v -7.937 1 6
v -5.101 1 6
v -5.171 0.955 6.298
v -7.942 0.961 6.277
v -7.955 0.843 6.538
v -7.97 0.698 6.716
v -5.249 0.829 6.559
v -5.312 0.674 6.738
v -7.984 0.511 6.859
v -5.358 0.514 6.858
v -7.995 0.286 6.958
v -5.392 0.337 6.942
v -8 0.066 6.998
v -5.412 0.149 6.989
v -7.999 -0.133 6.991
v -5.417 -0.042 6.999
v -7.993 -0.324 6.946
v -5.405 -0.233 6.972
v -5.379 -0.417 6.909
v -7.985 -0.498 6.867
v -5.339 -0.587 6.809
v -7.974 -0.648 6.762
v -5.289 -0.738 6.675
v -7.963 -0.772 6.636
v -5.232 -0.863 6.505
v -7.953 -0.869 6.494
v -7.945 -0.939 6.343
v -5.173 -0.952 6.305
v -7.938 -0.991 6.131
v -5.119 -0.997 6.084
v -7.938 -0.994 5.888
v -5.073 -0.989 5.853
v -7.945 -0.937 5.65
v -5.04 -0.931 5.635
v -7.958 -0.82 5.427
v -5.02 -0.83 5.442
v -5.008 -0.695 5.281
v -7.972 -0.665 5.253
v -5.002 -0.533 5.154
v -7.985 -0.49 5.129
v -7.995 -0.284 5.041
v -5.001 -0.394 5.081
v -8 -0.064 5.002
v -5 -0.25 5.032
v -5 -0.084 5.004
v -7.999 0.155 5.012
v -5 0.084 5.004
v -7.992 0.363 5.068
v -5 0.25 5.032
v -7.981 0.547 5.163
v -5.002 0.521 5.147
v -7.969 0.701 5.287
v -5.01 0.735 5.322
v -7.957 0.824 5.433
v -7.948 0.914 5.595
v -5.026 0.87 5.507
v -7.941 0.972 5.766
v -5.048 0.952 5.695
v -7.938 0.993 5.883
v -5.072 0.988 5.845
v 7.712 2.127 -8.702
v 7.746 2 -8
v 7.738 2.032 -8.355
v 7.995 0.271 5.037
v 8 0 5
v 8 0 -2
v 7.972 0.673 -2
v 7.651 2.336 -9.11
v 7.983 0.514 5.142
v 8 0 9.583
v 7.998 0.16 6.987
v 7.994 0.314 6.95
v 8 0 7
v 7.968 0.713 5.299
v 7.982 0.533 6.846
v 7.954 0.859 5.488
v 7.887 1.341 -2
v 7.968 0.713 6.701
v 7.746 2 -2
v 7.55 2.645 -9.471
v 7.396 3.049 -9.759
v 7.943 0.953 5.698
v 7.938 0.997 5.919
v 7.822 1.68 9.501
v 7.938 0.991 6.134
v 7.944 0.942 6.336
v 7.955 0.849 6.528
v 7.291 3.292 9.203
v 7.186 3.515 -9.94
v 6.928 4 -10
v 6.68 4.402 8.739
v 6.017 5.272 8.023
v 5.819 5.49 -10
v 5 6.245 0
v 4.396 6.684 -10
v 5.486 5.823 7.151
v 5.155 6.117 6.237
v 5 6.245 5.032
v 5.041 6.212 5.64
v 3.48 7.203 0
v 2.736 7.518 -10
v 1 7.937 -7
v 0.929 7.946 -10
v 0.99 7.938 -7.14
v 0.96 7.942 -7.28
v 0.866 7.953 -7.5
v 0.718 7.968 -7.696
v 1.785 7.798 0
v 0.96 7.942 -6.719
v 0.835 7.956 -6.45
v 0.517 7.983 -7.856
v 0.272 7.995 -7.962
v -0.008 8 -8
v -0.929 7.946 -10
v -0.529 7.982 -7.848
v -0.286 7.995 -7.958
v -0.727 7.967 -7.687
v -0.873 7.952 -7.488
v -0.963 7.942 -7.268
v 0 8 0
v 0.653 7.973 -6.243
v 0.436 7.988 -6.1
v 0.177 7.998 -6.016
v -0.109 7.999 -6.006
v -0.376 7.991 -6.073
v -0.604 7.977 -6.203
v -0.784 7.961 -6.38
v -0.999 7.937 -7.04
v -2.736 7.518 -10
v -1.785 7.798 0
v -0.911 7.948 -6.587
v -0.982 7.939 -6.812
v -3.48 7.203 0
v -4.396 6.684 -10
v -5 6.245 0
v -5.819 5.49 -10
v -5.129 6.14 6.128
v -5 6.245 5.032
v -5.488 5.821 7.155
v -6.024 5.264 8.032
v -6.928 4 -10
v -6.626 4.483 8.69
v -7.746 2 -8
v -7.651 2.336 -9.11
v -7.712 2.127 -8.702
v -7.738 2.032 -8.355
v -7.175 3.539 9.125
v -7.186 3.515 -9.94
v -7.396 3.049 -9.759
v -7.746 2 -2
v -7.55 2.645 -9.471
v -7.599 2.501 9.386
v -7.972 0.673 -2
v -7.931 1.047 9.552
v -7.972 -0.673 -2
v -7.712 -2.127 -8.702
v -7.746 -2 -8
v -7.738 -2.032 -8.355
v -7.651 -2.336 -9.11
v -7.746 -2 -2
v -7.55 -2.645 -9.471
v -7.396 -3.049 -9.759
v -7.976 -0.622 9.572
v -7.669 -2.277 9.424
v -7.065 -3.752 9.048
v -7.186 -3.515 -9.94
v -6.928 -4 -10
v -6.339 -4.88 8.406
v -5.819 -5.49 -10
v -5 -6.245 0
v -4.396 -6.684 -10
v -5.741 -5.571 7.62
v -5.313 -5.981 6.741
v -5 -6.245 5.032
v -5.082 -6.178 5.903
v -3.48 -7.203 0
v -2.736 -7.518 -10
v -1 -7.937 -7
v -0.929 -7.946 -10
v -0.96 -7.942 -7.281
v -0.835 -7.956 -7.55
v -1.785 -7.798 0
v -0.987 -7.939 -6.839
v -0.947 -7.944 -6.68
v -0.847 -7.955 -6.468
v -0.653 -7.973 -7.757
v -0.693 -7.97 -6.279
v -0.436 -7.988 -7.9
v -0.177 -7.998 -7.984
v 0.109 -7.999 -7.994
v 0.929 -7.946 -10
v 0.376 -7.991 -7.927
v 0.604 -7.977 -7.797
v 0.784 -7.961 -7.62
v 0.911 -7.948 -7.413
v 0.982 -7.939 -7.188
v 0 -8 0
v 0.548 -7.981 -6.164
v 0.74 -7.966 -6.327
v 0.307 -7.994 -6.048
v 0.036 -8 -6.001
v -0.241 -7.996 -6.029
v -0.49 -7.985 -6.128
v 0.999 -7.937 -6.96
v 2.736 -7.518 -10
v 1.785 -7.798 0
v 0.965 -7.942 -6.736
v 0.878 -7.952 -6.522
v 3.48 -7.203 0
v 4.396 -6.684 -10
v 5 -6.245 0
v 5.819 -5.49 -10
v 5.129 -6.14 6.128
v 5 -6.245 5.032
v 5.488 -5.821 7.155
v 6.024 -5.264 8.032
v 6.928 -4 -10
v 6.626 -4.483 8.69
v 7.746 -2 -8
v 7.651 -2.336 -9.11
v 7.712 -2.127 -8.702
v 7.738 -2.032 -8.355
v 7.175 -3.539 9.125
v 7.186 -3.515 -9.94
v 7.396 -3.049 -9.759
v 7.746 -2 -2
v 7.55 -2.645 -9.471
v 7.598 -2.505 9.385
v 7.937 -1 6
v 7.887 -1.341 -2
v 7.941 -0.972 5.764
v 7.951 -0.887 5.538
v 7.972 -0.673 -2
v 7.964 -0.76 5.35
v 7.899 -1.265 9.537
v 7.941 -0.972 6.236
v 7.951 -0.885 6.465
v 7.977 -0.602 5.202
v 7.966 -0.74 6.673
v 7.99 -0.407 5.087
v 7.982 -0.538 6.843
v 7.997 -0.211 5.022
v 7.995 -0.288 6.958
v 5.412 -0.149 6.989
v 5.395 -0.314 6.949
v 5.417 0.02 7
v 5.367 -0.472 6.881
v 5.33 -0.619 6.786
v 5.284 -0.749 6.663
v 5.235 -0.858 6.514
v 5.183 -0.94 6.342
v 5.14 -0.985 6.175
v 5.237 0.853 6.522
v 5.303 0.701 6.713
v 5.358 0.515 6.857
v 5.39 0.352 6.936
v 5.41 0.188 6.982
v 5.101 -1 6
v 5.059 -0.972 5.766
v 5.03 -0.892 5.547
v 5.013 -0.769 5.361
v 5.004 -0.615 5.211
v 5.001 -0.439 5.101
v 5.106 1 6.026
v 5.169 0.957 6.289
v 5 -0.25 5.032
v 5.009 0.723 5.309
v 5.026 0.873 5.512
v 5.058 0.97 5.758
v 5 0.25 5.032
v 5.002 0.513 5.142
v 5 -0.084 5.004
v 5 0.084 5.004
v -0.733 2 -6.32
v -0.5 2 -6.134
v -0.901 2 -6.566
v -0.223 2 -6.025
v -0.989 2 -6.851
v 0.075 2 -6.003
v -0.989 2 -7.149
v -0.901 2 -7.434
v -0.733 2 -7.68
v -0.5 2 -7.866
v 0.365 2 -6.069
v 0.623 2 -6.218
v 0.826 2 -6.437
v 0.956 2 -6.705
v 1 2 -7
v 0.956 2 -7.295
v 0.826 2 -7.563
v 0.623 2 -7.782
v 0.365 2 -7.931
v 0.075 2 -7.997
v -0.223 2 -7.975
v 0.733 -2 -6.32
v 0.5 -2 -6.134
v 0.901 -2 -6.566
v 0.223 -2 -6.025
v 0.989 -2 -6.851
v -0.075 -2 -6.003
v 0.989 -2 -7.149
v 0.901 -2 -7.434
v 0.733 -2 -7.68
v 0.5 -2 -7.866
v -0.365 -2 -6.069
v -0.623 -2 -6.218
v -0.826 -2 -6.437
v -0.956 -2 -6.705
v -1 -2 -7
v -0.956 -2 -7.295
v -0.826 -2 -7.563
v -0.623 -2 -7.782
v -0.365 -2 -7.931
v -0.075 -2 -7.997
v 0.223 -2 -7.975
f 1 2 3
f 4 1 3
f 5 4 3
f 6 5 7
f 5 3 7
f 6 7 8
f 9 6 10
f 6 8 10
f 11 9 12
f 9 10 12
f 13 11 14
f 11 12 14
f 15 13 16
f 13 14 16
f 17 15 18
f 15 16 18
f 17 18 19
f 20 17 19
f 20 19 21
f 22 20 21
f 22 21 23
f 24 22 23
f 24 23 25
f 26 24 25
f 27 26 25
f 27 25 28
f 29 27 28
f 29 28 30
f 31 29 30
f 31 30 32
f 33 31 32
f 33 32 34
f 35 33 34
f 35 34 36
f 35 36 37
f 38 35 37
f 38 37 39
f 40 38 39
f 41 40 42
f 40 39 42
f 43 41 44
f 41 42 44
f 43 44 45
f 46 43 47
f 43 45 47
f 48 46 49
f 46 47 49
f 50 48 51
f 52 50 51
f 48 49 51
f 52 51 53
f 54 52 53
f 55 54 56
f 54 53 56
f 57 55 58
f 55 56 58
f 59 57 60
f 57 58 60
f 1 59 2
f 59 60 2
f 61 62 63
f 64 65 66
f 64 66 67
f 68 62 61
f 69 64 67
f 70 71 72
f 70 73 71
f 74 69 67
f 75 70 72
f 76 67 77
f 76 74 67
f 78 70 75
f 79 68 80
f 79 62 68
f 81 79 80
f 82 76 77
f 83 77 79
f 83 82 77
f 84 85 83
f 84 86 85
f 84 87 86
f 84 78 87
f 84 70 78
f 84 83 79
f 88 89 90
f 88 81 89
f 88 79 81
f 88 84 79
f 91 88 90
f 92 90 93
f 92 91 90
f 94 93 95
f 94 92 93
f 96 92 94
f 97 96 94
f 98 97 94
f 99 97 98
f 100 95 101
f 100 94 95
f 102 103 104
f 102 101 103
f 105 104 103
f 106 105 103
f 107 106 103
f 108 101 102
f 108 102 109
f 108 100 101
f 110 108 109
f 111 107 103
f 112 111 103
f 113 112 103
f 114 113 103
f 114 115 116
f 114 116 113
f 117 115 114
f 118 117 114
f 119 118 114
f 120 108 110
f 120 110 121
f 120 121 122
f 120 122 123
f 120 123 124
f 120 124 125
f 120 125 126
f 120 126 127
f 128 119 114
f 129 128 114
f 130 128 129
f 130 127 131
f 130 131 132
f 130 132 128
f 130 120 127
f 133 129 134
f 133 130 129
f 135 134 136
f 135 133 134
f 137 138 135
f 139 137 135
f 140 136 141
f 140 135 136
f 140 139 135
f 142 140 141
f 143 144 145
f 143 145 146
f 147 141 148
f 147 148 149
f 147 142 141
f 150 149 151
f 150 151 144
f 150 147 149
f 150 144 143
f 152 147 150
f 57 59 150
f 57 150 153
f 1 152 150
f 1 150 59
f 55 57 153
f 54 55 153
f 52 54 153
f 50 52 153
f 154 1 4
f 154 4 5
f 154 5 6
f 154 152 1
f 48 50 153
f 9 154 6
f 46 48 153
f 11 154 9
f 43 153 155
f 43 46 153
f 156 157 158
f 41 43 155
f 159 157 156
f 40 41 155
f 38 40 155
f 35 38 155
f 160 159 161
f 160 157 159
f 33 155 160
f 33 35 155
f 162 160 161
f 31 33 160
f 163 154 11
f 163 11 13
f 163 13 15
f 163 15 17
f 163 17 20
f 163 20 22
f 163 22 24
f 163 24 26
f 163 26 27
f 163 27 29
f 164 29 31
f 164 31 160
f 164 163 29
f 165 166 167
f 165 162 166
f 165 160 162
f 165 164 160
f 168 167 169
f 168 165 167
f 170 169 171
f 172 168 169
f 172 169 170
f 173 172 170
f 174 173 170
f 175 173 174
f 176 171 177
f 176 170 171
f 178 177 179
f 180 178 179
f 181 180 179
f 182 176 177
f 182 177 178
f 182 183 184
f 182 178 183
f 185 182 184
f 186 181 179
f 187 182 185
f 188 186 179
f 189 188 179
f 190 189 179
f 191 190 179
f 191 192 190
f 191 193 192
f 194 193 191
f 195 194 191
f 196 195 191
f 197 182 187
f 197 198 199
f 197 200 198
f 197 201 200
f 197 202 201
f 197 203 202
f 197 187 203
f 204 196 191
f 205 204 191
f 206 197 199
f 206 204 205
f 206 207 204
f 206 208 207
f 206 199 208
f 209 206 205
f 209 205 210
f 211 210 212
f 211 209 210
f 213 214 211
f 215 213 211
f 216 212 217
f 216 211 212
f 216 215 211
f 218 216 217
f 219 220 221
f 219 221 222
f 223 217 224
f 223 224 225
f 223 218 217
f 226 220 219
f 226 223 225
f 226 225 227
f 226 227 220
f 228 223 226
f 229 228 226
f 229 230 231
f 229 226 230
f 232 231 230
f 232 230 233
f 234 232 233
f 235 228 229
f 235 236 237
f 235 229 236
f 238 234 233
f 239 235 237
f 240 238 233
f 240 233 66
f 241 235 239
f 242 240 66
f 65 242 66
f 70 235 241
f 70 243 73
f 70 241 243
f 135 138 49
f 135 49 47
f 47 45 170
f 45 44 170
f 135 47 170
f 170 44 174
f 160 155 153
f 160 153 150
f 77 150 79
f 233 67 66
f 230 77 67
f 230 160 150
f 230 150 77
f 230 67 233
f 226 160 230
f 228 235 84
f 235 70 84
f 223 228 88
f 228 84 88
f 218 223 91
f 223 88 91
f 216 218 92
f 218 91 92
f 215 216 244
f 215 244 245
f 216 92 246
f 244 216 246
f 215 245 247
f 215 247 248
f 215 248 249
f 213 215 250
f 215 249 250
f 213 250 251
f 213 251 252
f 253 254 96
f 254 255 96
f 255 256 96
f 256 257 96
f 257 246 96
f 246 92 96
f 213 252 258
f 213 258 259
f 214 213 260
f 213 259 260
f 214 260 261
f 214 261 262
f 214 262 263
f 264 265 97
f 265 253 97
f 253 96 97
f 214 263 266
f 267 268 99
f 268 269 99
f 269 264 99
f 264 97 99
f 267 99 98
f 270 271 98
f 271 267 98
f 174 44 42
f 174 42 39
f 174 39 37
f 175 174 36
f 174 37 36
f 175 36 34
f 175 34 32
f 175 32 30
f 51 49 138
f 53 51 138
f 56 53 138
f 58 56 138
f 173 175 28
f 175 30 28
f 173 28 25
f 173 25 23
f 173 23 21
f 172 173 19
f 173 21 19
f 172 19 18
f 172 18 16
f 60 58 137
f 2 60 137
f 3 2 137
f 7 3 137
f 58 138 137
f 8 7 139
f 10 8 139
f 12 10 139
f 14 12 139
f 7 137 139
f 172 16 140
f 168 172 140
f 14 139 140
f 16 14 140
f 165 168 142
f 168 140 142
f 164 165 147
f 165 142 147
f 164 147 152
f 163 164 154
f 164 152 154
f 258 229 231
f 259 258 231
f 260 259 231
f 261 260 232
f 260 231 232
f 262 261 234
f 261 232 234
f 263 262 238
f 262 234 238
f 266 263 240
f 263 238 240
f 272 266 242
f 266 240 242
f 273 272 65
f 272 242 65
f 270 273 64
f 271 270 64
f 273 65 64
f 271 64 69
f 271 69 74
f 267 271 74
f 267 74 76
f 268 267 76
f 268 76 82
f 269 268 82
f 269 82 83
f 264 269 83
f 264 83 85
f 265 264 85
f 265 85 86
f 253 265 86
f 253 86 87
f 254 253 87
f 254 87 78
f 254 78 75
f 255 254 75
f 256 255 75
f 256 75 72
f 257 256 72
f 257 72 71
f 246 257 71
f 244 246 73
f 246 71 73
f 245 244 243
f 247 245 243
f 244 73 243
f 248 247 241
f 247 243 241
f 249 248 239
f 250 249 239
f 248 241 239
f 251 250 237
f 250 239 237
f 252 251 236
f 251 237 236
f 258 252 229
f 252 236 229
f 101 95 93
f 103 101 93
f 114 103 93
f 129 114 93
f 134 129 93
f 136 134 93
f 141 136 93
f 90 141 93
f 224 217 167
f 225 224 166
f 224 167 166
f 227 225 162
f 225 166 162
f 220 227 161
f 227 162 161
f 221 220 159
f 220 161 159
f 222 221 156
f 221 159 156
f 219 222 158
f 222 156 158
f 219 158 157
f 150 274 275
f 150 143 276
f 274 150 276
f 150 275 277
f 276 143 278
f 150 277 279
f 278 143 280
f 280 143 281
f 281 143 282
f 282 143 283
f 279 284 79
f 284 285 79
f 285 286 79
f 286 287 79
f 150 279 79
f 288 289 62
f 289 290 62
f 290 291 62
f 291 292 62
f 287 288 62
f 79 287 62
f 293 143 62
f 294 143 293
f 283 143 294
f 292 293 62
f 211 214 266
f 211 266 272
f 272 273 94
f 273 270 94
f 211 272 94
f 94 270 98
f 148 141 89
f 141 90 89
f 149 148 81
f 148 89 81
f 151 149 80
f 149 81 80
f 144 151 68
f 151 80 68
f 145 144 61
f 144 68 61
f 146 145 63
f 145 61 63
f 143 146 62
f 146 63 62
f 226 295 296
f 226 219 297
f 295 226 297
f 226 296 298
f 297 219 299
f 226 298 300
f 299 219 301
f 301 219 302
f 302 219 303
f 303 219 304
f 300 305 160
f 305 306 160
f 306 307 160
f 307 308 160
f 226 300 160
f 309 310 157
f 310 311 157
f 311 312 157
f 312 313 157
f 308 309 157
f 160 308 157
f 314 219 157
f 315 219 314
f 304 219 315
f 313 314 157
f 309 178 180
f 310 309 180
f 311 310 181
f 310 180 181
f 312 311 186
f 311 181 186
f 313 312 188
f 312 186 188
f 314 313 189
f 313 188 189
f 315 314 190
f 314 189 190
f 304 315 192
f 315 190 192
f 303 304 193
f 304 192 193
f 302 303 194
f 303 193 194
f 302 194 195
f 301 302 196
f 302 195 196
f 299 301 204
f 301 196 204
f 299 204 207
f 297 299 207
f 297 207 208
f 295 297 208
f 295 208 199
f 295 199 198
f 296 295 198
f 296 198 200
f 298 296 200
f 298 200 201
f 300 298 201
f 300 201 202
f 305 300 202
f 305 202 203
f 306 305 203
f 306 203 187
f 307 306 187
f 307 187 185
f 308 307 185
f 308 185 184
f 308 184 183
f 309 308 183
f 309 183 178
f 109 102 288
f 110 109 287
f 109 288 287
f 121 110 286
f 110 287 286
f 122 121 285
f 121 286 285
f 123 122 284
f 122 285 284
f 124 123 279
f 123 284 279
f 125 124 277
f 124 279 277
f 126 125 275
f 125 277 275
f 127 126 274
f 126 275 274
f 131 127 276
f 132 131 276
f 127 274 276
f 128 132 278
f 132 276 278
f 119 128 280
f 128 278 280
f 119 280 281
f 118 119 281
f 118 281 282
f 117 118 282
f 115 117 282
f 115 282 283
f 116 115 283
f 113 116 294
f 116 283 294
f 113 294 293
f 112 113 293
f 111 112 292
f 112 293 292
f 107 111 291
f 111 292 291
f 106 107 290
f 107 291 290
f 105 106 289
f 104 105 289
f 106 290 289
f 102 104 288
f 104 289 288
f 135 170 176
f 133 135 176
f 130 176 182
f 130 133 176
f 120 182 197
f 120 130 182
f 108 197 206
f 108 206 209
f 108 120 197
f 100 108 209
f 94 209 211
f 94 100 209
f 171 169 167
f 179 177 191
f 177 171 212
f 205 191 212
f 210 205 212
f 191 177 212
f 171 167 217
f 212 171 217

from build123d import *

# Parameters (mm, degrees)
F0_R        = 8
F1_DEPTH    = 10
F3_DEPTH    = 10
F5_D        = 2
F5_DEPTH    = 8.001
F6_D        = 2
F7_T1_DEPTH = 37.4894960018
F9_DEPTH    = 8
F11_D       = 2
F11_DEPTH   = 8.0010001
F13_D       = 2
F14_R       = 1.99999


# Not quite as in the source:
# - a fillet or chamfer that OpenCascade refuses, or shapes differently, is made with other operations: its cross-section is extruded or revolved along the edge and cut away or added
# - a fillet or chamfer is up to 0.001 mm smaller than in the source, because OpenCascade refuses the exact size


with BuildPart() as f1:
    # F0 (on Top) → F1 (new body, symmetric)
    with BuildSketch(Plane.XY):
        Circle(F0_R)
    extrude(amount=F1_DEPTH, both=True)

    # F2 (on face) → F3 (cut)
    with BuildSketch(Plane.XY.offset(10)):
        with BuildLine():
            ThreePointArc((5, 6.2449979984), (0, 8), (-5, 6.2449979984))
            Line((-5, 6.2449979984), (-5, -6.2449979984))
            ThreePointArc((-5, -6.2449979984), (0, -8), (5, -6.2449979984))
            Line((5, -6.2449979984), (5, 6.2449979984))
        make_face()
    extrude(amount=-F3_DEPTH, mode=Mode.SUBTRACT)

    # F5 (through all, one way)
    with BuildSketch(Plane.YZ):
        with Locations((0, 6)):
            Circle(F5_D / 2)
    extrude(amount=-F5_DEPTH, mode=Mode.SUBTRACT)

    # F6 (through all)
    with Locations(Plane(origin=(0, 0, 0), x_dir=(0, 1, 0), z_dir=(-1, 0, 0))):
        with Locations((0, -6)):
            Hole(F6_D / 2)

    # F7: fillet of radius 5 on 2 edges, made by hand

    # F7_s2 → F7_t1 (cut)
    with BuildSketch(Plane.XZ.offset(-18.7447480009)):
        with BuildLine():
            ThreePointArc((-4.9999, 5.0001), (-6.4643660941, 8.5356339059), (-9.9999, 10.0001))
            Line((-9.9999, 10.0001), (-9.9999, 10.1001))
            ThreePointArc((-9.9999, 10.1001), (-7.49995, 10.1), (-5, 10.1))
            Line((-5, 10.1), (-4.9, 10))
            ThreePointArc((-4.9, 10), (-4.9, 7.50005), (-4.8999, 5.0001))
            Line((-4.8999, 5.0001), (-4.9999, 5.0001))
        make_face()
        with BuildLine():
            ThreePointArc((9.9999, 10.0001), (6.4643660941, 8.5356339059), (4.9999, 5.0001))
            Line((4.9999, 5.0001), (4.8999, 5.0001))
            ThreePointArc((4.8999, 5.0001), (4.9, 7.50005), (4.9, 10))
            Line((4.9, 10), (5, 10.1))
            ThreePointArc((5, 10.1), (7.49995, 10.1), (9.9999, 10.1001))
            Line((9.9999, 10.1001), (9.9999, 10.0001))
        make_face()
    extrude(amount=F7_T1_DEPTH, mode=Mode.SUBTRACT)

    # F8 (on face) → F9 (cut)
    with BuildSketch(Plane(origin=(0, 0, -10), x_dir=(1, 0, 0), z_dir=(0, 0, -1))):
        with BuildLine():
            Line((7.7459666924, 2), (-7.7459666924, 2))
            ThreePointArc((-7.7459666924, 2), (-8, 0), (-7.7459666924, -2))
            Line((-7.7459666924, -2), (7.7459666924, -2))
            ThreePointArc((7.7459666924, -2), (7.9362375701, -1.0080343399), (8, 0))
            ThreePointArc((8, 0), (7.9362375701, 1.0080343399), (7.7459666924, 2))
        make_face()
    extrude(amount=-F9_DEPTH, mode=Mode.SUBTRACT)

    # F11 (through all, one way)
    with BuildSketch(Plane.XZ):
        with Locations((0, -7)):
            Circle(F11_D / 2)
    extrude(amount=-F11_DEPTH, mode=Mode.SUBTRACT)

    # F13 (through all)
    with Locations(Plane(origin=(0, 0, 0), x_dir=(1, 0, 0), z_dir=(0, 1, 0))):
        with Locations((0, 7)):
            Hole(F13_D / 2)

    # F14 (radius 2 in the source; OpenCascade refuses exactly that, so slightly less here)
    f14_edges = [f1.edges().sort_by_distance(p)[0] for p in [
        (0, -2, -10),
        (0, 2, -10),
    ]]
    fillet(f14_edges, radius=F14_R)


solid = f1.part
